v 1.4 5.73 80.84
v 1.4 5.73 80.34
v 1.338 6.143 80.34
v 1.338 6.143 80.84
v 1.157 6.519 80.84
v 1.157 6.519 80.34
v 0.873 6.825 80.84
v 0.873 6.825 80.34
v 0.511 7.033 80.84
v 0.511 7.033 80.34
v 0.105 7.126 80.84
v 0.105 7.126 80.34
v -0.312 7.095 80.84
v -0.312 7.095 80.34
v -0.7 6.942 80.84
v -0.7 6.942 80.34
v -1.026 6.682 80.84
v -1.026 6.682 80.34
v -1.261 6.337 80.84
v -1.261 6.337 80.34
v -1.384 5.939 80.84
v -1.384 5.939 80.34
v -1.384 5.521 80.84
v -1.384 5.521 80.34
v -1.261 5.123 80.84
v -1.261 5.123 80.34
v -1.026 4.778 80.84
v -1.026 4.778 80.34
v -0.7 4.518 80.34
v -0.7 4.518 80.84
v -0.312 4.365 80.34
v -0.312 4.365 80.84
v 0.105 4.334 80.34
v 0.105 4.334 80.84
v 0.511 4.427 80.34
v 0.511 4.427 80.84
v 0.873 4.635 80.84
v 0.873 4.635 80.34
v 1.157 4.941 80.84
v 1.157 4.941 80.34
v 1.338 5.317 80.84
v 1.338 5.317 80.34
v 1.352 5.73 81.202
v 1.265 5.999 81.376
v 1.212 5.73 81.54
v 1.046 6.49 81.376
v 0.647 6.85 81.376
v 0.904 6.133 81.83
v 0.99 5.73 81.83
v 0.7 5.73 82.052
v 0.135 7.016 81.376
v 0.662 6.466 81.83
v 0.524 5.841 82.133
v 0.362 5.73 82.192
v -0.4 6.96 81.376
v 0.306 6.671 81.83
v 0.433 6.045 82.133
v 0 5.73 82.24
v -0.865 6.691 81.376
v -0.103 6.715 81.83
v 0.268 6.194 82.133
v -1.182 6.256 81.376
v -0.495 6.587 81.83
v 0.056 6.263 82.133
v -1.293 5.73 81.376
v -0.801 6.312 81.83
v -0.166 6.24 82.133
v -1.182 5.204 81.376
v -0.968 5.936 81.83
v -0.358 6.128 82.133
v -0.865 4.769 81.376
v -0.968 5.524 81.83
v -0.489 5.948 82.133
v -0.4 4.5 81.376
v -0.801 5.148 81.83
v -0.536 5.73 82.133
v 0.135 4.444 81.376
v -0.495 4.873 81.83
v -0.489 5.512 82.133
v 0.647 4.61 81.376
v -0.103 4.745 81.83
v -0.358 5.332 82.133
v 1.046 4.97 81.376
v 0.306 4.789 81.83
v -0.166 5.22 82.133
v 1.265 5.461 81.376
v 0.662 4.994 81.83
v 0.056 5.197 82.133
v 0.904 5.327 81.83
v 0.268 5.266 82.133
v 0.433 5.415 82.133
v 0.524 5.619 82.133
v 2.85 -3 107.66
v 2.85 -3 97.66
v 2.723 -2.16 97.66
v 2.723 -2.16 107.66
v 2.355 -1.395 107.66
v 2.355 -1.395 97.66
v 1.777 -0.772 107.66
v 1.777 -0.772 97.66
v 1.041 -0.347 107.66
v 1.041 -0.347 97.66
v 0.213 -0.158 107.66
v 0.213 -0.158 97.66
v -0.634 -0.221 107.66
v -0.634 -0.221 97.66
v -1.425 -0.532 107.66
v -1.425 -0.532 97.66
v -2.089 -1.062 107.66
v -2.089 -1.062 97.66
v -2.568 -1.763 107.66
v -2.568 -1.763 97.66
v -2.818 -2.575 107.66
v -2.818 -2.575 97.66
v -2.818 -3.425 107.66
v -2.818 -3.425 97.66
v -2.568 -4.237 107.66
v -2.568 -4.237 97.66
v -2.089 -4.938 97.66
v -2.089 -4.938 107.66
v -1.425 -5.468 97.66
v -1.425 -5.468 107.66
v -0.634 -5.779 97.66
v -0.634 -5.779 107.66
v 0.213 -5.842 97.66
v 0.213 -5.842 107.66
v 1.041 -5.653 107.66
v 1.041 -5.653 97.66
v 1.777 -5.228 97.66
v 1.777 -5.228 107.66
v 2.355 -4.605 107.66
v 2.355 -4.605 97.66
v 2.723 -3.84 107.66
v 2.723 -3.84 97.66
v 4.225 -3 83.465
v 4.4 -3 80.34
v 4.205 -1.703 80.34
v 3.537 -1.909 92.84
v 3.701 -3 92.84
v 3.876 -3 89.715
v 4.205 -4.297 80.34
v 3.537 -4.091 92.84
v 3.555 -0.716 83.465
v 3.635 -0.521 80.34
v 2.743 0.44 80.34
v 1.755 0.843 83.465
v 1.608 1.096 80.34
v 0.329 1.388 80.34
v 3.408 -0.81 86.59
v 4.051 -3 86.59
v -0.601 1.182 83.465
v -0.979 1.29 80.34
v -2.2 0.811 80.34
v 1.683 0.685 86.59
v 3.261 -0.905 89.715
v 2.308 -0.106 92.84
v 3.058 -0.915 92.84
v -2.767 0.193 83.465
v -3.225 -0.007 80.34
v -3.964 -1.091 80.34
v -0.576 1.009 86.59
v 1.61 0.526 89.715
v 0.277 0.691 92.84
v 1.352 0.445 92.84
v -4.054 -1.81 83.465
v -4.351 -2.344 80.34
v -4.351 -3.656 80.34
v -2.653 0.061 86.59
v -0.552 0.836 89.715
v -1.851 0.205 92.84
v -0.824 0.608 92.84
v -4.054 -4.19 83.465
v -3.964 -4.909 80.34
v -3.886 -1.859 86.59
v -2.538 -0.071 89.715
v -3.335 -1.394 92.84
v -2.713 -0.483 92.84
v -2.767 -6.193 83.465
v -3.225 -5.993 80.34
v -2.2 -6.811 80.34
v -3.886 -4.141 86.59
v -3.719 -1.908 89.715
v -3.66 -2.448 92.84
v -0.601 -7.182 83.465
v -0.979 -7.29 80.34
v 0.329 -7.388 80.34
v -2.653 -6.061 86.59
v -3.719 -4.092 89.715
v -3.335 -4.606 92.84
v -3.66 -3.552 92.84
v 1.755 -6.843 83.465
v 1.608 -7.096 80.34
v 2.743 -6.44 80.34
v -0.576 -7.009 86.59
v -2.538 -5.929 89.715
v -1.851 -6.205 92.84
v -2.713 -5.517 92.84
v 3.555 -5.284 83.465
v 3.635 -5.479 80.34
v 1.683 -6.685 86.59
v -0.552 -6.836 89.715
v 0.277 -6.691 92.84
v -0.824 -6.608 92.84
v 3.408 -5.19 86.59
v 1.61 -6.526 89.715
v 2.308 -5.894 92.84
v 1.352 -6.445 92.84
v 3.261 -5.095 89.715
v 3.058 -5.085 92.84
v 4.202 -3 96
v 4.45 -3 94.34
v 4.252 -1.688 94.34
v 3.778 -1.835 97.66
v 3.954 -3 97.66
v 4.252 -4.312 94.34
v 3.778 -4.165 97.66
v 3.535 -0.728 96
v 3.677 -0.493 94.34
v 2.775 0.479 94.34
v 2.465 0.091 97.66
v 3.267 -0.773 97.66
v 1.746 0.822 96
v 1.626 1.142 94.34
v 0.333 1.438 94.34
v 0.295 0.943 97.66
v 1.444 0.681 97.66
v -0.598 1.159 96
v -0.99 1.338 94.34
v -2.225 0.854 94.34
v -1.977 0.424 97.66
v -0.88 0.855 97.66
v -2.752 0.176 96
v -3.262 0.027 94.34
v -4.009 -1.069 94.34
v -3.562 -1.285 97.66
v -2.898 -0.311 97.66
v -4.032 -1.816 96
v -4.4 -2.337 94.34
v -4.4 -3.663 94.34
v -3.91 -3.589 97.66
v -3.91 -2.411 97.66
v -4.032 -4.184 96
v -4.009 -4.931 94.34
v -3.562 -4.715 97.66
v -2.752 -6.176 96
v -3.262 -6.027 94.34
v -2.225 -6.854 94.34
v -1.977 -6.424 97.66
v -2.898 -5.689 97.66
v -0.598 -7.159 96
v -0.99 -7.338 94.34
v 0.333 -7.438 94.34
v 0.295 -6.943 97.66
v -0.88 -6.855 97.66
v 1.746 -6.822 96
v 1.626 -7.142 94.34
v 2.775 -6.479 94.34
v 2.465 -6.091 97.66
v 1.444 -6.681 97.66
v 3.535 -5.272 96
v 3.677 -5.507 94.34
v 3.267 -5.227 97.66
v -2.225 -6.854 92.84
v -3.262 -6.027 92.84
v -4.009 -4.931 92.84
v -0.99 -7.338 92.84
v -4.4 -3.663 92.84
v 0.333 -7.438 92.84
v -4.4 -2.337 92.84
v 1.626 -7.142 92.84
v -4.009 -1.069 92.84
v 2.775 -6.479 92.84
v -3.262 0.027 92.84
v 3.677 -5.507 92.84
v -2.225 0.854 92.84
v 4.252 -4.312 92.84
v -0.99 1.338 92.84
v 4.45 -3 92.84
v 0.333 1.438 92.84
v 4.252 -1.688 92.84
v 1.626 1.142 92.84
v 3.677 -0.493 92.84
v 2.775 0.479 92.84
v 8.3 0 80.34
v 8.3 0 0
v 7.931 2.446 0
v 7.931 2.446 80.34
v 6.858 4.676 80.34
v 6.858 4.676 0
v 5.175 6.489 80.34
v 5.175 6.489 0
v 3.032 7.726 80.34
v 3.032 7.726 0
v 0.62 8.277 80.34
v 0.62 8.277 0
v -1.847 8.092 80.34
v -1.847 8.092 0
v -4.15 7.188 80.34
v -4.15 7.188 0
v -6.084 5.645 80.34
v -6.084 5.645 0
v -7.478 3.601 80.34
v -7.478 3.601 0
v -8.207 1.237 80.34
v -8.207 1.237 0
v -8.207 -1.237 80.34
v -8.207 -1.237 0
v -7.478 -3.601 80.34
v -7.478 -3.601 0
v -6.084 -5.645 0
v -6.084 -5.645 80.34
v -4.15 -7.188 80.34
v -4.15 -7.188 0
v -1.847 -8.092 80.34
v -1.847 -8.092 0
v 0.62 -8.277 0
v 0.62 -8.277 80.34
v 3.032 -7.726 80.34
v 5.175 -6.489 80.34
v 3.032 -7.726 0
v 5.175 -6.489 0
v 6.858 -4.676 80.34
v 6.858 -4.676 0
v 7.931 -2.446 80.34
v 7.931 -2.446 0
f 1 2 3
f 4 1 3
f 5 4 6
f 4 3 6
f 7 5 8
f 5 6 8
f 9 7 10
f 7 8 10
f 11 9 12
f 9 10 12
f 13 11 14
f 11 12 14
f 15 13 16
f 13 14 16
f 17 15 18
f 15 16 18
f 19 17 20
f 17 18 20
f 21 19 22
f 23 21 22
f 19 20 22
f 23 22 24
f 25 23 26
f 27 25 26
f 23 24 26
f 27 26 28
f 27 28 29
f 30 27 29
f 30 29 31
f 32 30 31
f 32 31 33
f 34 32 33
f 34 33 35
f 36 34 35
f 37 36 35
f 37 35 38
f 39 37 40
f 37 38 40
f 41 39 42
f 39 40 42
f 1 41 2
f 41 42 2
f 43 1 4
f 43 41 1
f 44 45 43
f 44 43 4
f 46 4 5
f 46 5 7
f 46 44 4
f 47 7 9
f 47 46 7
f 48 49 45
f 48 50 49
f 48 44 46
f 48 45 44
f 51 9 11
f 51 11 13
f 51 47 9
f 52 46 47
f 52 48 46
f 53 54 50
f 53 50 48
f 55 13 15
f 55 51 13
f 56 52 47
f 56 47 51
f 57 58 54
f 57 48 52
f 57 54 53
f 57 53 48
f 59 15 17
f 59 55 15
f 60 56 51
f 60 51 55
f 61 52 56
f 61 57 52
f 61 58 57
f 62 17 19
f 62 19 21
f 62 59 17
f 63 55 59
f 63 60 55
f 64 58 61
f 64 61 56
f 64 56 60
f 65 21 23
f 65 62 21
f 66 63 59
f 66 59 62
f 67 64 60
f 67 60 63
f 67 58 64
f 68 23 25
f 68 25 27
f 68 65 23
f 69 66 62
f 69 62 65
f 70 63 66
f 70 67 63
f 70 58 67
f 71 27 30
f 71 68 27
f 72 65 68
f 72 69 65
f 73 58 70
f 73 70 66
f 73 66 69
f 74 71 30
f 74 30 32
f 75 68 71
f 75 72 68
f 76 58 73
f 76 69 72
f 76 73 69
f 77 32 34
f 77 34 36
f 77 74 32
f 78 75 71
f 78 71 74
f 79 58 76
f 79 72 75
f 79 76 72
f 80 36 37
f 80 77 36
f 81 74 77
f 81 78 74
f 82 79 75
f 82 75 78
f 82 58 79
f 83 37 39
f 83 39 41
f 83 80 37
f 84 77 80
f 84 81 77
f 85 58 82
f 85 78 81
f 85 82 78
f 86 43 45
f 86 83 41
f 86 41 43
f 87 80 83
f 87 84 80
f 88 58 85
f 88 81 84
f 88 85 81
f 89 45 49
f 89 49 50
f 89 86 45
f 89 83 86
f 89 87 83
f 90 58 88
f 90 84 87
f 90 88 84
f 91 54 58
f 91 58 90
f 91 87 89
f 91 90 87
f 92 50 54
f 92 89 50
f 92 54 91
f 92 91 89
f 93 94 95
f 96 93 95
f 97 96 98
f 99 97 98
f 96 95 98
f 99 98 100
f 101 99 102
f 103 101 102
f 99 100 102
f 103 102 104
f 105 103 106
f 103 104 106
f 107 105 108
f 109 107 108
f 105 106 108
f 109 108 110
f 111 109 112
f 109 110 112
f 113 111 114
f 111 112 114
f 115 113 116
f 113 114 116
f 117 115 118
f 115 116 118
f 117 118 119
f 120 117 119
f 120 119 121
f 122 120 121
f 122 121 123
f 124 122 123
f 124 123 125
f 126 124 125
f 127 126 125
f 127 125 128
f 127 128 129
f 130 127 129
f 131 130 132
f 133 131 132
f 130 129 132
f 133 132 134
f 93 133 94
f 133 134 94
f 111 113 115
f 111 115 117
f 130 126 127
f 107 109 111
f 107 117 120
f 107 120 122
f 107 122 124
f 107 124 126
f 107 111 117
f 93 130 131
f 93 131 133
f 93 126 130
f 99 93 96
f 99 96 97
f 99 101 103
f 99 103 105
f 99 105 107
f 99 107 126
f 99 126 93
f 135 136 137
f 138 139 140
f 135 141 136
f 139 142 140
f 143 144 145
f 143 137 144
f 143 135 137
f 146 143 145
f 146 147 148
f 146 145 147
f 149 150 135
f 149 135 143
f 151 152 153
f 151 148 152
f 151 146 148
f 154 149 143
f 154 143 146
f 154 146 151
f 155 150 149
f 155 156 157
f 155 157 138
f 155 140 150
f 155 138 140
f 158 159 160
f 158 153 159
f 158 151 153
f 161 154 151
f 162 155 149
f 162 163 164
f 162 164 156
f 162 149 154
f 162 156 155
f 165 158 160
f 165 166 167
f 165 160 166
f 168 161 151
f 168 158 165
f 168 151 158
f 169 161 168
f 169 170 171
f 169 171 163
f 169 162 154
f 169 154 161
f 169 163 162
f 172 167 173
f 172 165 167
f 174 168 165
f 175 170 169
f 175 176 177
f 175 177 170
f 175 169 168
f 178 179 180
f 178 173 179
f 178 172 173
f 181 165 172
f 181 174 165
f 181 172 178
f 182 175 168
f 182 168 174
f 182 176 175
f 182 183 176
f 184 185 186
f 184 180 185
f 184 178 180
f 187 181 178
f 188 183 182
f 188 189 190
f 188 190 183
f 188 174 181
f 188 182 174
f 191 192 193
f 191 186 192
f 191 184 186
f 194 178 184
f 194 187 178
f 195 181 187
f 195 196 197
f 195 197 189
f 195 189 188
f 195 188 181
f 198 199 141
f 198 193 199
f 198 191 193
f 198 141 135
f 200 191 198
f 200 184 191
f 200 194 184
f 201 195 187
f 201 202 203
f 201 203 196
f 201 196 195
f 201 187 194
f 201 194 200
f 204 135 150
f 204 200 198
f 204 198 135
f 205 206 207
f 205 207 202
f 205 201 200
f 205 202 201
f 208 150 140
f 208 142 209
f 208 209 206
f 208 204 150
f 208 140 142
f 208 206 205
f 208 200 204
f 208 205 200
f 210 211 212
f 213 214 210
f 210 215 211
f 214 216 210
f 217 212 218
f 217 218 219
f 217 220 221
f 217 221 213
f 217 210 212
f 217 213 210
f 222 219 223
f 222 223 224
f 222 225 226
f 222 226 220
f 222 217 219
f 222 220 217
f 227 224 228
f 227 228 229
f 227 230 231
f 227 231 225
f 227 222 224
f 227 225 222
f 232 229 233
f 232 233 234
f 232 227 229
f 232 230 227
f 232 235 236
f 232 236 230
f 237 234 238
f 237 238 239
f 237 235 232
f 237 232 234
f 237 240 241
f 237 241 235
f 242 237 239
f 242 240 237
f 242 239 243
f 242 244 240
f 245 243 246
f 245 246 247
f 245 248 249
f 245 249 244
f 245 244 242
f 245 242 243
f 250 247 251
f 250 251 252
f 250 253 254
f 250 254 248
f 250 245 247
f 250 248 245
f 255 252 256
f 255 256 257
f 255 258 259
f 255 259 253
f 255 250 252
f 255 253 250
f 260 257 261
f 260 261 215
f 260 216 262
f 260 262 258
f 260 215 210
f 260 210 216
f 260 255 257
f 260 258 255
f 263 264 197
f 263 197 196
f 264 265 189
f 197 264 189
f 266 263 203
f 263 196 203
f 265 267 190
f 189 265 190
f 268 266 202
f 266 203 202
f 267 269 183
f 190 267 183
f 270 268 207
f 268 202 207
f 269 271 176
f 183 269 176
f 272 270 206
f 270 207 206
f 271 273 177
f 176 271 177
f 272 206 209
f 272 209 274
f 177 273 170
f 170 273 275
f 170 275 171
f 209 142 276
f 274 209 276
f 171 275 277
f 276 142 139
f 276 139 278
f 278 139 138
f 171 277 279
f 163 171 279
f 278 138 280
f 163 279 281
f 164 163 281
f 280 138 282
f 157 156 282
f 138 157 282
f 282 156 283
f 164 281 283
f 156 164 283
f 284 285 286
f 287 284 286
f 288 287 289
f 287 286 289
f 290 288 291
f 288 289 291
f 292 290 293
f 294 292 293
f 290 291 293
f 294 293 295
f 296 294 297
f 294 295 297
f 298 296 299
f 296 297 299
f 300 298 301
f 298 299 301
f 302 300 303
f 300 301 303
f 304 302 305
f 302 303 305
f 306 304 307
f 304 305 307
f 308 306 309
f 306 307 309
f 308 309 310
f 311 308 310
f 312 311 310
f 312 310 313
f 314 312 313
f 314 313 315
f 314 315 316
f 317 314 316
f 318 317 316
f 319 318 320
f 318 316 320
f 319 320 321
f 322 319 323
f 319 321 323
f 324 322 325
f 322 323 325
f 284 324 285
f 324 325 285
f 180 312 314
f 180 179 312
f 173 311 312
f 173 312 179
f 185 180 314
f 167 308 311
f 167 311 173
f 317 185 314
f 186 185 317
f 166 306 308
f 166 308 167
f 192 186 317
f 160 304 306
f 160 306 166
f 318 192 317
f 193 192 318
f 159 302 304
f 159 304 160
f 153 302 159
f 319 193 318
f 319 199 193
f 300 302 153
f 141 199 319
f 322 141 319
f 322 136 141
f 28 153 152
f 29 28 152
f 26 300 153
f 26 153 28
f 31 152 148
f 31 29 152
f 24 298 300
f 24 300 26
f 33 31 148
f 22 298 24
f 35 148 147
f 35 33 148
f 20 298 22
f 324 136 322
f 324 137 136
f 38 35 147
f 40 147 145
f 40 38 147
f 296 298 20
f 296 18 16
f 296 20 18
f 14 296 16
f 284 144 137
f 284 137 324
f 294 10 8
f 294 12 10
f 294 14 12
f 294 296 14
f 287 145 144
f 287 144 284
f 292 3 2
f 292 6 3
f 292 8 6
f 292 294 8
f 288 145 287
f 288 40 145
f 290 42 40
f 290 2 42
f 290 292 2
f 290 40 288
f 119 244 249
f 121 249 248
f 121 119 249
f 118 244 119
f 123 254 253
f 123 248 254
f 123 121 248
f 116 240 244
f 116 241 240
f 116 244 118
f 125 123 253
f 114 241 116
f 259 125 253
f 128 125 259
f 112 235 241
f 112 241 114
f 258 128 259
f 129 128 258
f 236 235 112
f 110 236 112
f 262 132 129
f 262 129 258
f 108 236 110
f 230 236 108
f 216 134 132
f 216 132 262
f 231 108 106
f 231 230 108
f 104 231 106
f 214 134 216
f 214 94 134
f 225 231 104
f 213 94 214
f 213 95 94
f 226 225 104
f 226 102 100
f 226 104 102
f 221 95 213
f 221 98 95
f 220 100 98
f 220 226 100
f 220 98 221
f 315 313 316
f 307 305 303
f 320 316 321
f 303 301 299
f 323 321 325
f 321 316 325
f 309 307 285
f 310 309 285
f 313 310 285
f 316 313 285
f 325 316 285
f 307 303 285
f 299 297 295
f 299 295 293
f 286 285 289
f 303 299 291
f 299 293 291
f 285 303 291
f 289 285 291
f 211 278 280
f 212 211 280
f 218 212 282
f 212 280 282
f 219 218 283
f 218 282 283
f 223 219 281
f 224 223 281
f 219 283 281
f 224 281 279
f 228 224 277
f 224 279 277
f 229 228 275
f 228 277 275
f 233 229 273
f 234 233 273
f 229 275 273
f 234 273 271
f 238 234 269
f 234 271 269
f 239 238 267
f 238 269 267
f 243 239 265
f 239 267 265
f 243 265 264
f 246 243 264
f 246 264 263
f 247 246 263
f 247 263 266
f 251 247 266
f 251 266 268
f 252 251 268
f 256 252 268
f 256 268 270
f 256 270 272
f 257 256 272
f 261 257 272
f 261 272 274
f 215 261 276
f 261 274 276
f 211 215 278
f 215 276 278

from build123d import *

# Parameters (mm, degrees)
SKETCH1_R           = 8.3
BOSS_EXTRUDE1_DEPTH = 80.34
SKETCH2_R           = 1.4
BOSS_EXTRUDE2_DEPTH = 0.5
DOME1_FACE_RADIUS   = 1.4
DOME1_HEIGHT        = 1.4
SKETCH3_R           = 4.4
BOSS_EXTRUDE3_DEPTH = 12.5
BOSS_EXTRUDE3_TAPER = 3.2
SKETCH4_R           = 4.45
BOSS_EXTRUDE4_DEPTH = 1.5
SKETCH5_R           = 4.45
BOSS_EXTRUDE5_DEPTH = 3.32
BOSS_EXTRUDE5_TAPER = 8.5
SKETCH6_R           = 2.85
BOSS_EXTRUDE6_DEPTH = 10


with BuildPart() as part:
    # Sketch1 → Boss-Extrude1 (new body)
    with BuildSketch(Plane.XY):
        Circle(SKETCH1_R)
    extrude(amount=BOSS_EXTRUDE1_DEPTH)

    # Sketch2 → Boss-Extrude2 (add)
    with BuildSketch(Plane.XY.offset(80.34)):
        with Locations((0, 5.73)):
            Circle(SKETCH2_R)
    extrude(amount=BOSS_EXTRUDE2_DEPTH)

    # Dome1: a dome of height H over a round flat face of radius A is a cap of a sphere of radius (A * A + H * H) / (2 * H)
    dome1_r = (DOME1_FACE_RADIUS * DOME1_FACE_RADIUS + DOME1_HEIGHT * DOME1_HEIGHT) / (2 * DOME1_HEIGHT)
    dome1_base = Plane((0, 5.73, 80.84), z_dir=(0, 0, 1))
    with Locations(dome1_base.offset(DOME1_HEIGHT - dome1_r)):
        dome1_ball = Sphere(dome1_r, mode=Mode.PRIVATE)
    add(split(dome1_ball, bisect_by=dome1_base, keep=Keep.TOP, mode=Mode.PRIVATE))

    # Sketch3 → Boss-Extrude3 (add)
    with BuildSketch(Plane.XY.offset(80.34)):
        with Locations((0, -3)):
            Circle(SKETCH3_R)
    extrude(amount=BOSS_EXTRUDE3_DEPTH, taper=BOSS_EXTRUDE3_TAPER)

    # Sketch4 → Boss-Extrude4 (add)
    with BuildSketch(Plane.XY.offset(92.84)):
        with Locations((0, -3)):
            Circle(SKETCH4_R)
    extrude(amount=BOSS_EXTRUDE4_DEPTH)

    # Sketch5 → Boss-Extrude5 (add)
    with BuildSketch(Plane.XY.offset(94.34)):
        with Locations((0, -3)):
            Circle(SKETCH5_R)
    extrude(amount=BOSS_EXTRUDE5_DEPTH, taper=BOSS_EXTRUDE5_TAPER)

    # Sketch6 → Boss-Extrude6 (add)
    with BuildSketch(Plane.XY.offset(97.66)):
        with Locations((0, -3)):
            Circle(SKETCH6_R)
    extrude(amount=BOSS_EXTRUDE6_DEPTH)


solid = part.part
